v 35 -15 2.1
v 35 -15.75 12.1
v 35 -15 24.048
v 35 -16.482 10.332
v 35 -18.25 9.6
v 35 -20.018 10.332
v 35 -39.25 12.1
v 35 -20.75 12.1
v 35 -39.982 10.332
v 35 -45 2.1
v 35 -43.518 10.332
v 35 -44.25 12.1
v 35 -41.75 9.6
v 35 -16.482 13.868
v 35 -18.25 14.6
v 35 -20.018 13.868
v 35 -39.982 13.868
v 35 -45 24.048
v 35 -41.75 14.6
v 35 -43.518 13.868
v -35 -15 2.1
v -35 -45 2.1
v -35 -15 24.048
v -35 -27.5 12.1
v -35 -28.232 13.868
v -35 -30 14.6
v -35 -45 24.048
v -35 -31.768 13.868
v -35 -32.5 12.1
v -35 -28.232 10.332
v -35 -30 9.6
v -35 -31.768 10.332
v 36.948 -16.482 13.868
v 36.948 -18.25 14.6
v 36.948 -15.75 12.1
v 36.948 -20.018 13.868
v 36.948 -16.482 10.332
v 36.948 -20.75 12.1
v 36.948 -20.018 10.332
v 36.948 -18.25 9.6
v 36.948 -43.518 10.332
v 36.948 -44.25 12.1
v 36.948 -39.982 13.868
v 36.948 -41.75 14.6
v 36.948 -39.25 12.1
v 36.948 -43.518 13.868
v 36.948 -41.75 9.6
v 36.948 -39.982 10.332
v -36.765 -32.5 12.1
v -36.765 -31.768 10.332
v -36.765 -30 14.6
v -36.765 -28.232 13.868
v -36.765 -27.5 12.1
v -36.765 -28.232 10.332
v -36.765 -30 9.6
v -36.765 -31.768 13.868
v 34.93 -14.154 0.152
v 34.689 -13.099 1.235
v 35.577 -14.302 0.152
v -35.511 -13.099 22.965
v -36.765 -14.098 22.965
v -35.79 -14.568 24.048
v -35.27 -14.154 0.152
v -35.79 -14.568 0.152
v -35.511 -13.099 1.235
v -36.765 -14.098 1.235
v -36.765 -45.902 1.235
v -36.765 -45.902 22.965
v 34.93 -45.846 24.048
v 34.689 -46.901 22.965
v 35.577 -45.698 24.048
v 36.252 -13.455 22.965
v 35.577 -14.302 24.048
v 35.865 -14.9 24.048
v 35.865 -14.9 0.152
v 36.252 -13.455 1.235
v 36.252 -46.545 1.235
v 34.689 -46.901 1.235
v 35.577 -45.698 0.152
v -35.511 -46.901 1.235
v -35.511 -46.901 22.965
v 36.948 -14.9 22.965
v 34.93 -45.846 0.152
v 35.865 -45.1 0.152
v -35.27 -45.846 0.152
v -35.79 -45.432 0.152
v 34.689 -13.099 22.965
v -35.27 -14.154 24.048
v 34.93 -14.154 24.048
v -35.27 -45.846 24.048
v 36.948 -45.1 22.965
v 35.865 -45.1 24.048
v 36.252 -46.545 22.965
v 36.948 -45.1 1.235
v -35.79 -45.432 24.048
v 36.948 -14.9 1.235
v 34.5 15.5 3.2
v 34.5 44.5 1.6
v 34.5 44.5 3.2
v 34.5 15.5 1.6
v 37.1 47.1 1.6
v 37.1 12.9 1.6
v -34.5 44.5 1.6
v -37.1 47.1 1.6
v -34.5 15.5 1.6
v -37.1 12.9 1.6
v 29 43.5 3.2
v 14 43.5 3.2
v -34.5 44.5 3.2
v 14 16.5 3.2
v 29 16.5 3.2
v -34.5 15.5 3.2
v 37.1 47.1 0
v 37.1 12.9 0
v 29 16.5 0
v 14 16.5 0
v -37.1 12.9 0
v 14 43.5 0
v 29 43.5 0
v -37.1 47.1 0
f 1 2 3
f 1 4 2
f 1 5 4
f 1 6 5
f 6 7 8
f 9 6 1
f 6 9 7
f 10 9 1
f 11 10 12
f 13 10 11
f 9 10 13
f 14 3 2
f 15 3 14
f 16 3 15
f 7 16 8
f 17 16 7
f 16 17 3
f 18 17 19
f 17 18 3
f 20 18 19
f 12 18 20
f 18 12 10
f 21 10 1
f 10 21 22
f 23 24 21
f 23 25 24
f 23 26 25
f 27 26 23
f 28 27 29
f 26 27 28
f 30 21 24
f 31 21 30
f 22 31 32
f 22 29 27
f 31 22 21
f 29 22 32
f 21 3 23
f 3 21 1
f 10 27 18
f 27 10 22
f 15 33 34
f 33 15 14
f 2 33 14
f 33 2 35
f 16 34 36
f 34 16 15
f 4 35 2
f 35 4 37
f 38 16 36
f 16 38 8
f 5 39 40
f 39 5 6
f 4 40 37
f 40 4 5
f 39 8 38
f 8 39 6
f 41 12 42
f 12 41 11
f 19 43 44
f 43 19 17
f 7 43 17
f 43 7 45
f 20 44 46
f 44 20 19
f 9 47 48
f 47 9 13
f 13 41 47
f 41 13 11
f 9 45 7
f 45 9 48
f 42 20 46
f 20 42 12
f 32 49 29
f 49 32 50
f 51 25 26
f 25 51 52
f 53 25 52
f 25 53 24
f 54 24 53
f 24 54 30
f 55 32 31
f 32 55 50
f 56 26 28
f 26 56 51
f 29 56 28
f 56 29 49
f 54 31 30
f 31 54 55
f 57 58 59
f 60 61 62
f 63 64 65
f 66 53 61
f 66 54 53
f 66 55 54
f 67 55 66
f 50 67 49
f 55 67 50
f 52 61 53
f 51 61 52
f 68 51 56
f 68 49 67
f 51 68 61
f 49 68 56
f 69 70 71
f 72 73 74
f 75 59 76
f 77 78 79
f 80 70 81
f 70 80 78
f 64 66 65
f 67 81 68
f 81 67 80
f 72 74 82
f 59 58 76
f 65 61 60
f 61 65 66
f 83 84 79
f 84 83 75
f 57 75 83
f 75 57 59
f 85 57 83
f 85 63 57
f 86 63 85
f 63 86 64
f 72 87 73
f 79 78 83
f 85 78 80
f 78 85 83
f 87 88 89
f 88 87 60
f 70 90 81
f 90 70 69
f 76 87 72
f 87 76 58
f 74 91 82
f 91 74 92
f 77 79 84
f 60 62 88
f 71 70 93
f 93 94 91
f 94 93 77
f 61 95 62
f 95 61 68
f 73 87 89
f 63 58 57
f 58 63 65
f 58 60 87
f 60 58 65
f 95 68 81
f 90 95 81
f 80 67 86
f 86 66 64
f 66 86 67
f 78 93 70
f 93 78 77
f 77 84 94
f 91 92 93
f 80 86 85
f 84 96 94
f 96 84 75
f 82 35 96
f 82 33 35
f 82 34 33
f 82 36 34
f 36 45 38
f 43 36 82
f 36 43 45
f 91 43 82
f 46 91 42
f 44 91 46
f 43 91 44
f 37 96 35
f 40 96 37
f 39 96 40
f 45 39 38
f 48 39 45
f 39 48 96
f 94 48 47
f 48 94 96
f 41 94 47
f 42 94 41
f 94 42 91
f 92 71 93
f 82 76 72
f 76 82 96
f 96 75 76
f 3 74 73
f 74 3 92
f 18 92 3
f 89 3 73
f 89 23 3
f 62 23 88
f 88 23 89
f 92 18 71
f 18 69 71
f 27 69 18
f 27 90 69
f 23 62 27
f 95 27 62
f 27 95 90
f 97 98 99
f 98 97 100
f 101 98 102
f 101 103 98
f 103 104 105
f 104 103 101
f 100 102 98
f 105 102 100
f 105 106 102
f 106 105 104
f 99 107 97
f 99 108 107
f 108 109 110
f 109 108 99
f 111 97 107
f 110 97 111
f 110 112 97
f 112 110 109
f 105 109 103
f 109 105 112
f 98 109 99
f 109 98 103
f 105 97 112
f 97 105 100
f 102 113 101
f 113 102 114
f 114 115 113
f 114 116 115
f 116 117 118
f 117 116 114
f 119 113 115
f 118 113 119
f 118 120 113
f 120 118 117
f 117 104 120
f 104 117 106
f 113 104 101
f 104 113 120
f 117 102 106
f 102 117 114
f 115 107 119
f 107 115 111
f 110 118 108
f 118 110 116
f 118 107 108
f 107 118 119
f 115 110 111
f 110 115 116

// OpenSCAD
// Written by Jordi Riera-Babures <jrierab@gmail.com>
// LM2596 V1.0 - Parameterisized for Customizer
//
// To the extent possible under law, the author(s) have dedicated all
// copyright and related and neighboring rights to this software to the
// public domain worldwide. This software is distributed without any
// warranty.
//
// You should have received a copy of the CC0 Public Domain
// Dedication along with this software.
// If not, see <http://creativecommons.org/publicdomain/zero/1.0/>.

// Length of the board (mm)
Board_Length = 70;          // [40:300]
// Width of the board (mm)
Board_Width = 30;           // [10:40]
// Height of the board and its components (mm)
Board_Height = 20;          // [10:40]
// Volatge Window height (mm)
Voltage_Window = 15;        // [10:20]
// Volatge Window offset (mm)
Voltage_Window_offset = 5;  // [0:20]

// Input/output hole radius
Hole_radius = 2.5;          // [2:10]

// Space to take into account around the board (mm)
Security_Margin = 1;        // [0:5]
// Wall thickness (mm)
Wall_Thickness = 1.6;       // [1:5]

// Account for security margins and walls
Xtra = Security_Margin + 2*Wall_Thickness;
// Hole pos
Hole_pos_x = (Board_Length + Xtra) / 2;



// Build the box
translate([0, -Board_Width, (Board_Height + Xtra)/2]) LM2596_case();
// And the lidl
mirror([0, 0, 1]) translate([0, Board_Width, -1.5*Wall_Thickness]) LM2596_lid();

module LM2596_lid() {
    difference() {
        union() {
            // Internal lid
            cube([Board_Length - Security_Margin, Board_Width - Security_Margin, Wall_Thickness], true);
            translate([0, 0, Wall_Thickness])
                cube([Board_Length + Xtra, Board_Width + Xtra, Wall_Thickness], true);
        }
        union() {
            // Voltage window hole
            translate([(Board_Length - Voltage_Window)/2 - Voltage_Window_offset - Security_Margin, 0, 0])
                cube([Voltage_Window, Board_Width - 3*Security_Margin, 3*Wall_Thickness], true);
        }
    }

}

module LM2596_case() {
    // Smooth the case
    Rounded_Corner_Radius = 2;

    // Hole extension
    Hole_h = 1*(Wall_Thickness + Security_Margin);
    // Input hole Y tanslation
    Hole_y = (Board_Width - Hole_radius - 4*Security_Margin)/2;

    // Case
    difference() {
        // External case
        roundedcube_simple([Board_Length + Xtra, Board_Width + Xtra, Board_Height + Xtra], true, Rounded_Corner_Radius);
        // "Empty" inside block
        union() {
            // Internal board space
            cube([Board_Length, Board_Width, Board_Height], true);
            // Remove the top
            translate([0, 0, Board_Height])
                cube([Board_Length, Board_Width, Board_Height], true);
            // Input holes
            translate([Hole_pos_x - Hole_h, Hole_y, 0]) 
                rotate([90, 0, 90])
                    cylinder(Hole_h, r = Hole_radius, true);
            translate([Hole_pos_x - Hole_h, -Hole_y, 0]) 
                rotate([90, 0, 90])
                    cylinder(Hole_h, r = Hole_radius, true);
            // Output hole
            translate([-Hole_pos_x, 0, 0]) 
                rotate([90, 0, 90])
                    cylinder(Hole_h, r = Hole_radius, true);
        }
    }
}





// https://gist.github.com/groovenectar/292db1688b79efd6ce11
module roundedcube_simple(size = [1, 1, 1], center = false, radius = 0.5) {
	// If single value, convert to [x, y, z] vector
	size = (size[0] == undef) ? [size, size, size] : size;

	translate = (center == false) ?
		[radius, radius, radius] :
		[
			radius - (size[0] / 2),
			radius - (size[1] / 2),
			radius - (size[2] / 2)
	];

	translate(v = translate)
	minkowski() {
		cube(size = [
			size[0] - (radius * 2),
			size[1] - (radius * 2),
			size[2] - (radius * 2)
		]);
		sphere(r = radius);
	}
}
